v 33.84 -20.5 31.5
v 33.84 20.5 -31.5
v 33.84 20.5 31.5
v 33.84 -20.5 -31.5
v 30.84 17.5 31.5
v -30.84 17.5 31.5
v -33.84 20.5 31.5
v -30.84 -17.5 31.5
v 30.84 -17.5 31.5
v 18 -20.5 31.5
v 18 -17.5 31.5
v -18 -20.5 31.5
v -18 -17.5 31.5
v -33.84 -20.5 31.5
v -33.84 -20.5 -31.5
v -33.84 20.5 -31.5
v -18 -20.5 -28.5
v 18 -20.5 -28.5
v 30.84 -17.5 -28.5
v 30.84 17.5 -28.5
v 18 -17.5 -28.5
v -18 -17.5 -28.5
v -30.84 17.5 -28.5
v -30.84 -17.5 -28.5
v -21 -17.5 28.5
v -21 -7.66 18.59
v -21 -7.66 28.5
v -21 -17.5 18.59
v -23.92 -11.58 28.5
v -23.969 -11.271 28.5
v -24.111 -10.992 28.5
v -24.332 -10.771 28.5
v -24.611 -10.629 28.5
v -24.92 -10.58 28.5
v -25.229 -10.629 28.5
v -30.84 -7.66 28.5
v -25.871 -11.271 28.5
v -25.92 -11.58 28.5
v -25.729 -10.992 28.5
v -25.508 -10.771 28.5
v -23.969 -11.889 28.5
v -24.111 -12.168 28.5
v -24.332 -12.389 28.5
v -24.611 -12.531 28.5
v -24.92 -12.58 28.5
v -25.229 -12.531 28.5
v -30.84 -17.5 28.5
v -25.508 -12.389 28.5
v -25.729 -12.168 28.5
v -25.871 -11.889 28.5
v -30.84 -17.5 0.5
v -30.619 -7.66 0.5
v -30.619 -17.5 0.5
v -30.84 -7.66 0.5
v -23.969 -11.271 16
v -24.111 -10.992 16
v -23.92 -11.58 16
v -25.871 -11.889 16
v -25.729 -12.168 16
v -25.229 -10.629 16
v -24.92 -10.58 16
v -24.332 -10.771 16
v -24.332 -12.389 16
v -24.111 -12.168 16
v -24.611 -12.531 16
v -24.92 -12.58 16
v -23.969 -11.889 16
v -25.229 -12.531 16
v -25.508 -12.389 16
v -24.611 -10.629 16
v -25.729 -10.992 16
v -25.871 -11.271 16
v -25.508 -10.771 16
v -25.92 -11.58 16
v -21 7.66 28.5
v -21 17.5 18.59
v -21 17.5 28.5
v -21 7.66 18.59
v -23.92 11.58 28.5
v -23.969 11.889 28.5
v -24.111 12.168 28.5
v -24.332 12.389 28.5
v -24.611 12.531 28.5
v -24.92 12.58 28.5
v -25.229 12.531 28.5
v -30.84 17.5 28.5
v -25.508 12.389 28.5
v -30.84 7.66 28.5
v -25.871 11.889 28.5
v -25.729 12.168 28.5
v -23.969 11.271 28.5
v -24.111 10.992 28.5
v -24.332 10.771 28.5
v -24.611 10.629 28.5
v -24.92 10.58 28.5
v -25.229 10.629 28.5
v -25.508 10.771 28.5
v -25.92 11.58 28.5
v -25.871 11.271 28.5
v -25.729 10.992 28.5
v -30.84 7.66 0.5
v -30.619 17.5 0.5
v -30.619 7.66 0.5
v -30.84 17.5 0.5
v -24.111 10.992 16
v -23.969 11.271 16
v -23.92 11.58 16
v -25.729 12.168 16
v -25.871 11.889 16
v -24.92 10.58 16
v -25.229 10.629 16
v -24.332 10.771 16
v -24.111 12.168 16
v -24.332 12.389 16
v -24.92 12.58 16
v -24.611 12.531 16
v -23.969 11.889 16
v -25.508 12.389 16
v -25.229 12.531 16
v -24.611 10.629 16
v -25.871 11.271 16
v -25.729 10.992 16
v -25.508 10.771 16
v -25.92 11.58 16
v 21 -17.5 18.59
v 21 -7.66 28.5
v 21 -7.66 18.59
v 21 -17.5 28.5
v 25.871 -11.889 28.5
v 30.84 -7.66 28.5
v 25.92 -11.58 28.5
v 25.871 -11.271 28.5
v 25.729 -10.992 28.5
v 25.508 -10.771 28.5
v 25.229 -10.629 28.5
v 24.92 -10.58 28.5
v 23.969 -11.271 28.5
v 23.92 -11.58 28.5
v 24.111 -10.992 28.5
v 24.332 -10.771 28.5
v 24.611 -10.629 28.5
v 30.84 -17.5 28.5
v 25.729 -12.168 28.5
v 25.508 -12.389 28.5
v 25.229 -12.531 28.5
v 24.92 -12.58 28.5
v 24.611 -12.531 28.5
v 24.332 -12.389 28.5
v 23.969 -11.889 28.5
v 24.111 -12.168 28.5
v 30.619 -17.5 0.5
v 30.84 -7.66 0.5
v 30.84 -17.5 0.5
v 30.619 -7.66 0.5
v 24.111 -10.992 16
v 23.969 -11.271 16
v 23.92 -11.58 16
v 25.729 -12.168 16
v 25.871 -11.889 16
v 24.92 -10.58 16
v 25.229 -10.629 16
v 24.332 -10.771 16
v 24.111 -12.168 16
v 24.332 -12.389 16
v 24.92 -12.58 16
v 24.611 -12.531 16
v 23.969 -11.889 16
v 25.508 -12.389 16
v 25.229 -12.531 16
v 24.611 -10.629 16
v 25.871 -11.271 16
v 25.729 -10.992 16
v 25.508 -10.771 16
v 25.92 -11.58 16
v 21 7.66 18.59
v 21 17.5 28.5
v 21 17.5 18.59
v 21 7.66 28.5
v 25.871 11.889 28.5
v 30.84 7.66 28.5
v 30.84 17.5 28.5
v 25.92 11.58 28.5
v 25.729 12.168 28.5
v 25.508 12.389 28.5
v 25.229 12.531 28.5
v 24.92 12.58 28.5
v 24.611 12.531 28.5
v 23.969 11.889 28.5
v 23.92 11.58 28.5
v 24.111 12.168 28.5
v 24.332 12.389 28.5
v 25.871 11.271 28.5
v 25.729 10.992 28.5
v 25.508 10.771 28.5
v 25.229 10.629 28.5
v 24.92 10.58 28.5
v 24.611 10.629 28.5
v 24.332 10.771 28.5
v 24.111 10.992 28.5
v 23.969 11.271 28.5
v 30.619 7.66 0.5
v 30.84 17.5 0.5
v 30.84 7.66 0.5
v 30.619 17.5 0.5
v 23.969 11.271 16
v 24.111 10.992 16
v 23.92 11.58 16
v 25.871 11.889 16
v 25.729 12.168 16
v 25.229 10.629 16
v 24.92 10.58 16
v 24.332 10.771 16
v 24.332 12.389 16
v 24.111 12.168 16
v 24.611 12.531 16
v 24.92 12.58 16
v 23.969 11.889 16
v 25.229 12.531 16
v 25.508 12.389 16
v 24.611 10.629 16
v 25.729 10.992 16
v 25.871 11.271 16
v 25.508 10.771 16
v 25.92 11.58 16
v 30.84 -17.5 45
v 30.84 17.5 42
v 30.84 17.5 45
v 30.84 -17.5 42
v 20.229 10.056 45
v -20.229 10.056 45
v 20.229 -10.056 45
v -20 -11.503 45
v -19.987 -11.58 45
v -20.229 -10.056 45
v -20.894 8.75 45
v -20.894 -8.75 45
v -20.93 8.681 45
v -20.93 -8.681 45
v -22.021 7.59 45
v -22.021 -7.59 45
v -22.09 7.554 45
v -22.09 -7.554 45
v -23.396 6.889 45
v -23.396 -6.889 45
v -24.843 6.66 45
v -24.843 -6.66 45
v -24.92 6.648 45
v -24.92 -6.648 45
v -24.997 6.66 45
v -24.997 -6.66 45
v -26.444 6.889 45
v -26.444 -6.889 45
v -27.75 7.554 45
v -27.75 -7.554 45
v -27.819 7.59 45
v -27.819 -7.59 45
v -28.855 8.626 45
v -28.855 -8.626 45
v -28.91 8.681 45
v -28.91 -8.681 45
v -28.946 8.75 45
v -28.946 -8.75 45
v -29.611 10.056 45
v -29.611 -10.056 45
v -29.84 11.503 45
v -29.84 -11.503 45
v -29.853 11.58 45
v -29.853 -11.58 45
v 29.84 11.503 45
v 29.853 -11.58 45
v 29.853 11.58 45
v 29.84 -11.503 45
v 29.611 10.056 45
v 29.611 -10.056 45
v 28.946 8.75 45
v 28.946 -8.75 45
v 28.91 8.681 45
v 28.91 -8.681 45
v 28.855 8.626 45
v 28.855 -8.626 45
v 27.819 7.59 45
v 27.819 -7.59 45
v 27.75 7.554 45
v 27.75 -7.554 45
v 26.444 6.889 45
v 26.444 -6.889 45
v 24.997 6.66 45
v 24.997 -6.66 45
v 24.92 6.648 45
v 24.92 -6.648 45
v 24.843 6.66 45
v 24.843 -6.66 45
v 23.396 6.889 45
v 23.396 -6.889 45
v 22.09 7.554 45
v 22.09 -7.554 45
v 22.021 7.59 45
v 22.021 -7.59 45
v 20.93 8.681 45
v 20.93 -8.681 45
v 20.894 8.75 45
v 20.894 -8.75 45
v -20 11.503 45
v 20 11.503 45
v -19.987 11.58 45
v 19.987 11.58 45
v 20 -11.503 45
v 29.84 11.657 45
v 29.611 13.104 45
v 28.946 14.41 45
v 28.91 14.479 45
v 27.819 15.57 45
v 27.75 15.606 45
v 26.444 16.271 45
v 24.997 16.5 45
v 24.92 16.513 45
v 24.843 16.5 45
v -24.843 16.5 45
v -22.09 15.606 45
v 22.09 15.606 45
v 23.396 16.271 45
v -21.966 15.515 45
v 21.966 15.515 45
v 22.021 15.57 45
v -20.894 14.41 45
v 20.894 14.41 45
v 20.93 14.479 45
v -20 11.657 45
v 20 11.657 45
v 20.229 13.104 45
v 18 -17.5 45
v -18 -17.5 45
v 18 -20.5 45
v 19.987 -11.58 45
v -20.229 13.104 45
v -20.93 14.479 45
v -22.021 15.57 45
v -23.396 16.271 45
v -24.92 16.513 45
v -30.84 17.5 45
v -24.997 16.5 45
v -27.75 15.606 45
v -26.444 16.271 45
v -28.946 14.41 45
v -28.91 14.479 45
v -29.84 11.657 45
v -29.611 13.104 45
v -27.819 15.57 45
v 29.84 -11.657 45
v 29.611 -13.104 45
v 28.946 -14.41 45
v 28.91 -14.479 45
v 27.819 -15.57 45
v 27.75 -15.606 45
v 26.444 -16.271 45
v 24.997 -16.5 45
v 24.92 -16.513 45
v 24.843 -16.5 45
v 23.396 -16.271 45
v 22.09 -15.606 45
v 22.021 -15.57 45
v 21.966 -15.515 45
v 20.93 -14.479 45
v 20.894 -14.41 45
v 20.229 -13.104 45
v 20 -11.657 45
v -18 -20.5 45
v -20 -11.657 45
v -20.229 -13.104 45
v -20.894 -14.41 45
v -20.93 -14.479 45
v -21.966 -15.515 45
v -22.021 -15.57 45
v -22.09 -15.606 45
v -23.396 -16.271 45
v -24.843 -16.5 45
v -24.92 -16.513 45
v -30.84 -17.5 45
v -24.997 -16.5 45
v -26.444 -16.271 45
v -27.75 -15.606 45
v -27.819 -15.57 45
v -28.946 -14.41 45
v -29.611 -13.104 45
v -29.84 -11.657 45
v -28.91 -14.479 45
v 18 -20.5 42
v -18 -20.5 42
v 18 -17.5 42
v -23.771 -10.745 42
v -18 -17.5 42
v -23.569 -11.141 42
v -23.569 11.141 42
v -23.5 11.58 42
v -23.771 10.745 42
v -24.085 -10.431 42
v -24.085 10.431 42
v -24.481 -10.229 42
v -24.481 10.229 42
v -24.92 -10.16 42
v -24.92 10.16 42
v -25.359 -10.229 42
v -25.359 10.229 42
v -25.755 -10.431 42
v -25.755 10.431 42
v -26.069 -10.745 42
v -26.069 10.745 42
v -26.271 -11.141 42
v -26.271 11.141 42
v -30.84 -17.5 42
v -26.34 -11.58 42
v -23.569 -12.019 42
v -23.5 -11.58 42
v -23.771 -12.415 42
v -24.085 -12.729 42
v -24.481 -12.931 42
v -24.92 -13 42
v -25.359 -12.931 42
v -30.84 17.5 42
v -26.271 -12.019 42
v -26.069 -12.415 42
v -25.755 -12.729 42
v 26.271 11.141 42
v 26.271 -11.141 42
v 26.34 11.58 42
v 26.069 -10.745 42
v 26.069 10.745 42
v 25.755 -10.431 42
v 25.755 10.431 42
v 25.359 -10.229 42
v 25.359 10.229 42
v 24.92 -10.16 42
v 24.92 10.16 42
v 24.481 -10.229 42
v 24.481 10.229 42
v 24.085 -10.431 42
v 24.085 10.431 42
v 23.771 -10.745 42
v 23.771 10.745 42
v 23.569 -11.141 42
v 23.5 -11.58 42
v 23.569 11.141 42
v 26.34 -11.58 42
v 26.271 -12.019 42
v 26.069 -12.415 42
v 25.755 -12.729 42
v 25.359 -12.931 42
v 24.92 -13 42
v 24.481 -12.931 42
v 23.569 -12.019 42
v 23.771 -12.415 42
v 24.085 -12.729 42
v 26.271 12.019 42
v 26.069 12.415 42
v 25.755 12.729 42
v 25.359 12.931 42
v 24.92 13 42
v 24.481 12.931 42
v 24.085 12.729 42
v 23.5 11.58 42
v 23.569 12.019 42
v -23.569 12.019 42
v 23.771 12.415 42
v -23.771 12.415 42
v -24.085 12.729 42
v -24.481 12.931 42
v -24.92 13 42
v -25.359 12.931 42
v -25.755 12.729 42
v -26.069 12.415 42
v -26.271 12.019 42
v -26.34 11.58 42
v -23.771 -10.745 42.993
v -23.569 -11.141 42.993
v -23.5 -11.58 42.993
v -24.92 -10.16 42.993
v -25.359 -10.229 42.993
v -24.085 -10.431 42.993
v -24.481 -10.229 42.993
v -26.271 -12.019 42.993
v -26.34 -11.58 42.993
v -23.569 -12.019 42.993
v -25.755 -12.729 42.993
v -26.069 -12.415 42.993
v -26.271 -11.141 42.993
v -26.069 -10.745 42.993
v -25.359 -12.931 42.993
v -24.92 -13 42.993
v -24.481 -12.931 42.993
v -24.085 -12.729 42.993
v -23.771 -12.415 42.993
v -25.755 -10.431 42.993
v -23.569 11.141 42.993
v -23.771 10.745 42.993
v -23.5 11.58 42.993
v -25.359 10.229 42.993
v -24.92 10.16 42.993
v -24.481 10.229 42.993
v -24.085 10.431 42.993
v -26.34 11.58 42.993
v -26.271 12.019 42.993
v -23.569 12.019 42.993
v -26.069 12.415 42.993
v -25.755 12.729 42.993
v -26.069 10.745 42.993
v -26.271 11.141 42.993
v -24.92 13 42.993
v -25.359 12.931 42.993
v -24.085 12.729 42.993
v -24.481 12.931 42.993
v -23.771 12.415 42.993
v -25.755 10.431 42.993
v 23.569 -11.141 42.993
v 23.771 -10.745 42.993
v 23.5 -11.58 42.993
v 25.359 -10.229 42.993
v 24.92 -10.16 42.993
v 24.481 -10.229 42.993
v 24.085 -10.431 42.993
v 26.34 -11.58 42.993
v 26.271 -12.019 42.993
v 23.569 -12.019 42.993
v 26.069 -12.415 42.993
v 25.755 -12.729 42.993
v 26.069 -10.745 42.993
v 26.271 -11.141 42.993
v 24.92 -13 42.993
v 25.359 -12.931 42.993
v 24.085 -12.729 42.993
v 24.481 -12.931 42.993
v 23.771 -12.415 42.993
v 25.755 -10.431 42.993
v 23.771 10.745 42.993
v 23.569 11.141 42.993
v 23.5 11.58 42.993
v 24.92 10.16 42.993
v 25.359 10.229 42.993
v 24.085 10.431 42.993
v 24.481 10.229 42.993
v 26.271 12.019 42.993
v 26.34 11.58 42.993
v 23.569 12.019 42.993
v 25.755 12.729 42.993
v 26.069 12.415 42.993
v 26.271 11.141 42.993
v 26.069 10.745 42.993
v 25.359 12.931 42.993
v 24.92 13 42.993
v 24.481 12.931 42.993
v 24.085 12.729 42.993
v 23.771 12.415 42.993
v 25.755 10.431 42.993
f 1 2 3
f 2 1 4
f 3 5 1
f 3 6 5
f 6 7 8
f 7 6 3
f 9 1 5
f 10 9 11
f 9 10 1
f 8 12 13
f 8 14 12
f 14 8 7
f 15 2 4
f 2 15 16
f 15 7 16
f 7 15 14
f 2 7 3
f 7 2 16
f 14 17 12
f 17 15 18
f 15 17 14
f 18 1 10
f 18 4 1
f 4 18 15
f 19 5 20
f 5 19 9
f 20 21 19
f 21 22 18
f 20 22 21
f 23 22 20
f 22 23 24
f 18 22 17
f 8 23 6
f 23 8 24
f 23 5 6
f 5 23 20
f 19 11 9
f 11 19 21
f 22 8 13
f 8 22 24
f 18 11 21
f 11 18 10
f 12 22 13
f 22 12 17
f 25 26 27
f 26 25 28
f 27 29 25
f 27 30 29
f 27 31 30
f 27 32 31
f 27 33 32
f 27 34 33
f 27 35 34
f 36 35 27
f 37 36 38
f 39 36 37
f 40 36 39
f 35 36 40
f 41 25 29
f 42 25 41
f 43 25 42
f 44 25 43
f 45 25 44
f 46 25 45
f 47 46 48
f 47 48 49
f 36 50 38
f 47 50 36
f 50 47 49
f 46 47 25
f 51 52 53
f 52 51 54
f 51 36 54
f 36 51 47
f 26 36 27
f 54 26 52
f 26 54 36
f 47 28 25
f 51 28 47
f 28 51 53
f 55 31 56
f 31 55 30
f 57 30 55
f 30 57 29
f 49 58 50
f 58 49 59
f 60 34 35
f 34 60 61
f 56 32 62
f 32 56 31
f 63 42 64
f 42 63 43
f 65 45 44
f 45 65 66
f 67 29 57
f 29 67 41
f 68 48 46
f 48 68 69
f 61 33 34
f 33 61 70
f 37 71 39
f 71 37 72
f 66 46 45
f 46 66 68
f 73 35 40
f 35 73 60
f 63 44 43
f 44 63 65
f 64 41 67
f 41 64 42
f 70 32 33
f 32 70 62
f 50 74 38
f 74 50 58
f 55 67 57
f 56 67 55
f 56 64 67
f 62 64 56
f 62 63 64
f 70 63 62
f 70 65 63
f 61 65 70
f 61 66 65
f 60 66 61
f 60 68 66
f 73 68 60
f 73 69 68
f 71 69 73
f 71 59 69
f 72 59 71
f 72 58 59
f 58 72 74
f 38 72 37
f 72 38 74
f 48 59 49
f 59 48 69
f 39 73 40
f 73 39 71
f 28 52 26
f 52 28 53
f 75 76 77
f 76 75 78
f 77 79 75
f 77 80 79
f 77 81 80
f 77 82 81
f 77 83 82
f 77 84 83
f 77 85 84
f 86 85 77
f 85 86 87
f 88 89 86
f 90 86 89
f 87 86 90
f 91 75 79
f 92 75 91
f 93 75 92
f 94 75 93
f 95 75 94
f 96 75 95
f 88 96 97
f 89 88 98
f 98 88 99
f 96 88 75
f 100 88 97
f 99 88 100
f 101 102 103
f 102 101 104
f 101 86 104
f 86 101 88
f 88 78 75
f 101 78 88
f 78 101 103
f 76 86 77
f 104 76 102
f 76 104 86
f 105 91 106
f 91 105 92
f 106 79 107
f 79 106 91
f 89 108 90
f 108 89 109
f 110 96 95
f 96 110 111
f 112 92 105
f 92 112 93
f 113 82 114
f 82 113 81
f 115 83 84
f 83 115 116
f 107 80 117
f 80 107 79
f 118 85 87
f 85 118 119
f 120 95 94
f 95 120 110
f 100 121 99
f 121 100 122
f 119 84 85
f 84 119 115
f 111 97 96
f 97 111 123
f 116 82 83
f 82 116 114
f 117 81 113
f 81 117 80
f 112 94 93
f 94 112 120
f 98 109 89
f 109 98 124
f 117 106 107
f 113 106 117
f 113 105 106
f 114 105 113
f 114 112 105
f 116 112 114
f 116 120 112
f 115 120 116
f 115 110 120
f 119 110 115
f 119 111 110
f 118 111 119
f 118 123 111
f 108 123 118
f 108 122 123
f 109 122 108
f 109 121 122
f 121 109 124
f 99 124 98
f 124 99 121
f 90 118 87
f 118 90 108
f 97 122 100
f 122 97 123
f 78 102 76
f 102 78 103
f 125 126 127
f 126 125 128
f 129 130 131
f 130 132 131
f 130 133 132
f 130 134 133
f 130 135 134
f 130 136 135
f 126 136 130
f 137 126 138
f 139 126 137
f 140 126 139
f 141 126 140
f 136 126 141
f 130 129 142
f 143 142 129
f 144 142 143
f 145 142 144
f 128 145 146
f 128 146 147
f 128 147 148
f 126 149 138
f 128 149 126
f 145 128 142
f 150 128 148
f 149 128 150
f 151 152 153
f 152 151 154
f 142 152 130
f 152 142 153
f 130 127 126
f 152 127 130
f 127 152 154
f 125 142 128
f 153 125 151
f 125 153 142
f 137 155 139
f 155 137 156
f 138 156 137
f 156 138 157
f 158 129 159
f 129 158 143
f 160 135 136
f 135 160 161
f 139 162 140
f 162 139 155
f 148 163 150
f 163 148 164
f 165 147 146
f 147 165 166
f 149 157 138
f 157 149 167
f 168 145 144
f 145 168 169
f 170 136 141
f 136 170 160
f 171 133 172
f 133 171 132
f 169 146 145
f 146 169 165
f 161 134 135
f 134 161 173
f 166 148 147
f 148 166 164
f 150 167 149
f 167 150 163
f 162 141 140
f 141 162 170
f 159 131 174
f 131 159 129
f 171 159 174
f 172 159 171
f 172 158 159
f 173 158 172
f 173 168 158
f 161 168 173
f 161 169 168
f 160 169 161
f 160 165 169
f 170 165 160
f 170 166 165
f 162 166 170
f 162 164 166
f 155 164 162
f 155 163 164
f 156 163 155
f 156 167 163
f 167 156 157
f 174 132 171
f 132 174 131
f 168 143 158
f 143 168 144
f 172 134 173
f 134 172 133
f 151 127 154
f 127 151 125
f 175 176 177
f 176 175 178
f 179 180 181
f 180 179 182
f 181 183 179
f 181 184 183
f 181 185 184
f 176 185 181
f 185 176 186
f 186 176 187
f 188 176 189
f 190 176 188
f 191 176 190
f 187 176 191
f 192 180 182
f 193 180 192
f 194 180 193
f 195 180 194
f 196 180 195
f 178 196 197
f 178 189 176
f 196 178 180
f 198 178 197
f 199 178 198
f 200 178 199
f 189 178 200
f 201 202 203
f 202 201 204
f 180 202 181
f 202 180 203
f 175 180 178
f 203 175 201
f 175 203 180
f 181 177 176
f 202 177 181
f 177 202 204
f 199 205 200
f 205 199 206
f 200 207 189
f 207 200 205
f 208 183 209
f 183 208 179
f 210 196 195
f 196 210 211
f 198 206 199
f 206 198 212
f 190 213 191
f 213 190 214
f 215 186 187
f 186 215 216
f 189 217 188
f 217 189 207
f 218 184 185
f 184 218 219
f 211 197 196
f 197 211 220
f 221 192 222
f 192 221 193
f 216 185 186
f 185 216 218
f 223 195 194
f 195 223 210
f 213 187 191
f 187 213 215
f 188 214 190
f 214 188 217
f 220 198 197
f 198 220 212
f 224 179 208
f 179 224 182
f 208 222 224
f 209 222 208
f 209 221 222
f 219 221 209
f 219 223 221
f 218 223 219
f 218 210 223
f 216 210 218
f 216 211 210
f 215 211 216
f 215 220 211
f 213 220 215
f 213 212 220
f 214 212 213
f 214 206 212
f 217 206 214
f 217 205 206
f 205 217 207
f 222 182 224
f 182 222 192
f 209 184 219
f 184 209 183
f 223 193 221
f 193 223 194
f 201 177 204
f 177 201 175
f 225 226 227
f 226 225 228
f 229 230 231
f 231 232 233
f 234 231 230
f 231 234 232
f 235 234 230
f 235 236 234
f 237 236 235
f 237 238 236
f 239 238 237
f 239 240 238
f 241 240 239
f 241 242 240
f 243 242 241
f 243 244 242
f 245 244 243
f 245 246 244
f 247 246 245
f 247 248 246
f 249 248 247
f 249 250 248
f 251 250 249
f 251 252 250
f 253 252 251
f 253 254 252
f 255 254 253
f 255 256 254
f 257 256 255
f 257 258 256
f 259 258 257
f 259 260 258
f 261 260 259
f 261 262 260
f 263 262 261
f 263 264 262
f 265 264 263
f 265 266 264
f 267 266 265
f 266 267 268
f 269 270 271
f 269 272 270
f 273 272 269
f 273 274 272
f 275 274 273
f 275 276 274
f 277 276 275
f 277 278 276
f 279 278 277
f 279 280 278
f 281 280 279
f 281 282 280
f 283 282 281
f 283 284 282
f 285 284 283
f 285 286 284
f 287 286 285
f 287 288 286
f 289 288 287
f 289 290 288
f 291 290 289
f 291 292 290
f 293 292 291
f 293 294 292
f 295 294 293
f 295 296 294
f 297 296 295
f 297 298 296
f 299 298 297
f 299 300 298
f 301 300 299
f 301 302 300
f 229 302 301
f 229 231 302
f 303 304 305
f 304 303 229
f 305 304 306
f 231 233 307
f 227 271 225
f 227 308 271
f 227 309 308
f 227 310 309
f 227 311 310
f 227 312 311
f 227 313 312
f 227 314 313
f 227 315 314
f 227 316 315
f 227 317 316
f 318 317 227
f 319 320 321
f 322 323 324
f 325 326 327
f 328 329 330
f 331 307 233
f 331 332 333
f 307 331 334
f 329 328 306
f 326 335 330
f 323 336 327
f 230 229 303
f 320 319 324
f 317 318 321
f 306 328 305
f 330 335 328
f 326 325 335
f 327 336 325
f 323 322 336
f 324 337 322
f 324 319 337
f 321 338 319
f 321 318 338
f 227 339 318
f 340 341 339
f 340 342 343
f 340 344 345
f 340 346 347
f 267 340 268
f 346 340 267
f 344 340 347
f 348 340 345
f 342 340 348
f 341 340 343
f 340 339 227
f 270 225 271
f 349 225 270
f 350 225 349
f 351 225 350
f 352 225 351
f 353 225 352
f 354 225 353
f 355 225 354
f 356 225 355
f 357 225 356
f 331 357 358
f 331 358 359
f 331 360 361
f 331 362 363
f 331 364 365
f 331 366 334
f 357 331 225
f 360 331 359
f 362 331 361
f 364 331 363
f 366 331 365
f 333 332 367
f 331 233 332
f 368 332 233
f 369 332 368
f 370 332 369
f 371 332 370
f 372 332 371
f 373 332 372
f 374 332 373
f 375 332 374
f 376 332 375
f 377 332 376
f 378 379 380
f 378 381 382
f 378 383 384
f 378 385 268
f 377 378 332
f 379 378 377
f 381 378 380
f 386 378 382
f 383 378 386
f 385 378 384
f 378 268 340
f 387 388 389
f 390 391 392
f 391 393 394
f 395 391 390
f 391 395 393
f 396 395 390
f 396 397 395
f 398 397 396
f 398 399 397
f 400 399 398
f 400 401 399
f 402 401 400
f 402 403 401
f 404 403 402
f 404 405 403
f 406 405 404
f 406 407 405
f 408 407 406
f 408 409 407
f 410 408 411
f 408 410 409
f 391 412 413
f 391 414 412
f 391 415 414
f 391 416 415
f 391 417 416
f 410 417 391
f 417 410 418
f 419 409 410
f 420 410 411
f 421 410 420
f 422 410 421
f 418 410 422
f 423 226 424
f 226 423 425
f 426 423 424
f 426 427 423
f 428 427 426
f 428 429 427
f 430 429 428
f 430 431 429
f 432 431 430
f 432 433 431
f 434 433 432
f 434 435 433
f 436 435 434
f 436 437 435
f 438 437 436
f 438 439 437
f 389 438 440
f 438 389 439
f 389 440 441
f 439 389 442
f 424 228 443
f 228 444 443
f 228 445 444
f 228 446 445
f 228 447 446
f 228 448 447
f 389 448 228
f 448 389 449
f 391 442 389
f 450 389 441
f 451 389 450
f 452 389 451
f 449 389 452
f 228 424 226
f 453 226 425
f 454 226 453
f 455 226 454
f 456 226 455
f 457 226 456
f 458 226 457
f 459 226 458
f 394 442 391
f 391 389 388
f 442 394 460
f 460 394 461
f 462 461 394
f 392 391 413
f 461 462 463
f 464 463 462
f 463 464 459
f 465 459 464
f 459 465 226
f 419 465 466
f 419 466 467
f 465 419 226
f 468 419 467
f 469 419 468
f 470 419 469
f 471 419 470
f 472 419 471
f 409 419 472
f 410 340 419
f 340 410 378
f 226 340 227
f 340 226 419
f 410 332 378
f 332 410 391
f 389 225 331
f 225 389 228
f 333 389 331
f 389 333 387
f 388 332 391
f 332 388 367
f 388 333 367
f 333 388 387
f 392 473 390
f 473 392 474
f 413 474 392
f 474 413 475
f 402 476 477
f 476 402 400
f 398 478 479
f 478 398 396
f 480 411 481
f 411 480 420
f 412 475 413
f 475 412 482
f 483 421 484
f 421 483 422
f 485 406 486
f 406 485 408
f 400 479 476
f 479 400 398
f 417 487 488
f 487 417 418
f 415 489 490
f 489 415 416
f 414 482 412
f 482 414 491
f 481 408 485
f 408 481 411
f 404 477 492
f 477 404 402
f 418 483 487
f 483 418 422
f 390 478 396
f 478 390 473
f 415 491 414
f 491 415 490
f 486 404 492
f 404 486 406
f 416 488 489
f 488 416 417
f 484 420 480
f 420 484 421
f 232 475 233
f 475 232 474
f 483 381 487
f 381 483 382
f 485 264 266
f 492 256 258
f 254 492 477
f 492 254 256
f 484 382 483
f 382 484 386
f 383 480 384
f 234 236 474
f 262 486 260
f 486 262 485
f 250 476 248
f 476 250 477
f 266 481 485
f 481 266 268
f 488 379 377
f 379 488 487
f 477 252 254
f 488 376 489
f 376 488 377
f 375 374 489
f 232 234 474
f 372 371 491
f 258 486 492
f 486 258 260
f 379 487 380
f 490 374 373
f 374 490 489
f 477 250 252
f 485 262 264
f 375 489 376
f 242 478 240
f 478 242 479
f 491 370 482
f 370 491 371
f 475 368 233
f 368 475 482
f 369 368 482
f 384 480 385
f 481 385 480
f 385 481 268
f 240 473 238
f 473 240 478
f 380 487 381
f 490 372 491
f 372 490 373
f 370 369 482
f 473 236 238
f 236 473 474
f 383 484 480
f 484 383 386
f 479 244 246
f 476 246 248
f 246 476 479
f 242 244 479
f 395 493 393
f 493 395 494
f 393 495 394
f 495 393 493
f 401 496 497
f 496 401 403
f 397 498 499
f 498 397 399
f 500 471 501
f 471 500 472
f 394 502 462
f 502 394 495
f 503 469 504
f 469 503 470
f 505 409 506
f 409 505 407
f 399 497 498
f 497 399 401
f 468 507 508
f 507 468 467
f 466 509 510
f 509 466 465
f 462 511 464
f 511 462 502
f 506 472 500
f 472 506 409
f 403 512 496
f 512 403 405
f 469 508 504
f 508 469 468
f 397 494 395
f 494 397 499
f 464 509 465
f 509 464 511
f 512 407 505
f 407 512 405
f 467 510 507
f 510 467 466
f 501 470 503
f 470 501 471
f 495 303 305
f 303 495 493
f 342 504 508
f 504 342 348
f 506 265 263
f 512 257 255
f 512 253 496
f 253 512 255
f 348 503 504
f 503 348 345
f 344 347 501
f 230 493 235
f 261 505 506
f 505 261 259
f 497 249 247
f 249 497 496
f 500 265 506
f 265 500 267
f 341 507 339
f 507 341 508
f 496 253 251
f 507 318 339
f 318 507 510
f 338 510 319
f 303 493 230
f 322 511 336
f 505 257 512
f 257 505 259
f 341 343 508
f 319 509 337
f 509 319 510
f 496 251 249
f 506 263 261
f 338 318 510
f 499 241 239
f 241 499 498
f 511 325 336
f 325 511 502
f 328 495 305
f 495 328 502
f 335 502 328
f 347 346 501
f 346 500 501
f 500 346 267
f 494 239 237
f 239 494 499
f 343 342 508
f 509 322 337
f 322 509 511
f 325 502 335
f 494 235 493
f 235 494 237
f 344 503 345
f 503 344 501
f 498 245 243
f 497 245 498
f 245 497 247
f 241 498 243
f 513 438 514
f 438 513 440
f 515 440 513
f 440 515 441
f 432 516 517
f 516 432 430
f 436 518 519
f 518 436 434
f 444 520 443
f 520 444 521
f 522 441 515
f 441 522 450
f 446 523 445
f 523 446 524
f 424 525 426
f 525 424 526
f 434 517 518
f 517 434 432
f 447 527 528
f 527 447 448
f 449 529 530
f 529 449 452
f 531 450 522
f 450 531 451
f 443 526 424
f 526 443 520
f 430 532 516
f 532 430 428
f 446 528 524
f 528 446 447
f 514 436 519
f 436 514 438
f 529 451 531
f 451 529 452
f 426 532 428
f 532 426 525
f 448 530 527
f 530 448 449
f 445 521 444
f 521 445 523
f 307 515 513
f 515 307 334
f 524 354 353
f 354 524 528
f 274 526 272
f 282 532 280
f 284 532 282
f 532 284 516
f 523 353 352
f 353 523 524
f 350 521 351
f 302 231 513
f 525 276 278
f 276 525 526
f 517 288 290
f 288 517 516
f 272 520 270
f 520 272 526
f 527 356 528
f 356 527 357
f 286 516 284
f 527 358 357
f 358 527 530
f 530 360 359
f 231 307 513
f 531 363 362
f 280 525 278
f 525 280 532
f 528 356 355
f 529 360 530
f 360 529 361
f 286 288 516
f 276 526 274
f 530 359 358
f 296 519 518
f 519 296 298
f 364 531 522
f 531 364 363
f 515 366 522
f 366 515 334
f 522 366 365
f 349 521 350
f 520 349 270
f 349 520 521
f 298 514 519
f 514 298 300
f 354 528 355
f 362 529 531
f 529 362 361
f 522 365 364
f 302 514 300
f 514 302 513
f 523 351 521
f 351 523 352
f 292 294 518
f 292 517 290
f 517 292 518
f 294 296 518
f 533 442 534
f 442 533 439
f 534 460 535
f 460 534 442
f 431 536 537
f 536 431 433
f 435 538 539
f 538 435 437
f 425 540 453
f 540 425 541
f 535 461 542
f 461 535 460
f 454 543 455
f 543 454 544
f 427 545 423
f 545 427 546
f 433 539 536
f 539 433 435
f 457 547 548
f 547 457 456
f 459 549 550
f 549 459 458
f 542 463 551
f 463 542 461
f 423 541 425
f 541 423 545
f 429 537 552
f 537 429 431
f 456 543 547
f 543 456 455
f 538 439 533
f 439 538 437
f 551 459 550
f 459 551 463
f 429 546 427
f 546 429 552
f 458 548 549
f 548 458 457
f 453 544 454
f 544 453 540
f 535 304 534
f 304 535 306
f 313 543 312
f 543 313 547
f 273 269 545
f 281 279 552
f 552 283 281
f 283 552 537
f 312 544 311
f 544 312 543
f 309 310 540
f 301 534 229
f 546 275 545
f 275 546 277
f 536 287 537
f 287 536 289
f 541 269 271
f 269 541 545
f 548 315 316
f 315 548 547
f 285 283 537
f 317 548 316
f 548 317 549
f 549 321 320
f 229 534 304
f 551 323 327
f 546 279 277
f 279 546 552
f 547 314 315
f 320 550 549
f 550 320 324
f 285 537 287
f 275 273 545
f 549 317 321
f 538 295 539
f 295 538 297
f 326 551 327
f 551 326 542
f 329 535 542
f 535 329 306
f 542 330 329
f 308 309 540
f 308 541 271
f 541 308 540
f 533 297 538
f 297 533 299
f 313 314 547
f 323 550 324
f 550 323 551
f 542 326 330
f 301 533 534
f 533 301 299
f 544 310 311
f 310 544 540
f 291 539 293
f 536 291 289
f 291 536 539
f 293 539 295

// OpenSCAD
// The rectangular hole for the clip-in mains connector

mainsHoleX = 36;
mainsHoleY = 3;
mainsHoleZ = 57;

// How far back do the works go?

mainsDepth = 35;

// Countersunk Self Tapping Screws (RS 546-5480 - UTS #4, 13mm)

ScrewDia = 2.84;
ScrewPitch = 0.635;
ScrewRootDia = ScrewDia - ScrewPitch*5.0*sqrt(3.0)/8.0;
ScrewLength = 13;
ScrewHead = ScrewDia*2;

MainsBox();
MainsLid();

module MainsLid()
{
	translate([0,0, mainsHoleZ/2 + 15])
	difference()
	{
		union()
		{
			translate([0, (mainsHoleY - 3)/2, 0])
				cube([mainsHoleX+2*(ScrewDia+7) + 6, mainsDepth, 
					3], center=true);
			translate([0, (mainsHoleY - 3)/2-mainsDepth/2 - mainsHoleY/2, 0])
				cube([mainsHoleX, mainsHoleY, 3], 
					center=true);
		}

		for(x = [-1,1]) for(y=[-1,1])
		translate([x*((mainsHoleX+2*(ScrewDia+7)+6)/2-(ScrewDia+7)/2), 
				y*((mainsDepth)/2-(ScrewDia+7)/2 - (0.5 - y/2)*(mainsHoleY - 3)/2), 
				0])
					if(x < 0 && y < 0)
					{
							ScrewCentre(rad = ScrewDia/2, cone=true);
					} else if (x < 0 && y > 0)
					{
						mirror([0, 1, 0])
							ScrewCentre(rad = ScrewDia/2, cone=true);
					}else if (x > 0 && y < 0)
					{
						mirror([1, 0, 0])
							ScrewCentre(rad = ScrewDia/2, cone=true);
					}else
					{
						mirror([1, 0, 0])
						mirror([0, 1, 0])
							ScrewCentre(rad = ScrewDia/2, cone=true);
					}	
		}			
						
}


module MainsBox()
{
	union()
	{
		difference()
		{
			cube([mainsHoleX + 2*(ScrewDia+7) + 12, mainsDepth + 3 + mainsHoleY, 
				mainsHoleZ + 6], center=true);
			translate([0, (mainsHoleY - 3)/2, 3])
				cube([mainsHoleX+2*(ScrewDia+7) + 6, mainsDepth, mainsHoleZ + 6], 
					center=true);
			translate([0, -mainsDepth/2, 3])
				cube([mainsHoleX, mainsDepth, mainsHoleZ + 6], 
					center=true);
		}
		for(x = [-1,1]) for(y=[-1,1])
		translate([x*((mainsHoleX+2*(ScrewDia+7)+6)/2-(ScrewDia+7)/2), 
				y*((mainsDepth)/2-(ScrewDia+7)/2 - (0.5 - y/2)*(mainsHoleY - 3)/2), 
				(mainsHoleZ + 6 - (ScrewLength + 15))/2 - 3])
					if(x < 0 && y < 0)
					{
							ScrewHole(cn=false);
					} else if (x < 0 && y > 0)
					{
						mirror([0, 1, 0])
							ScrewHole(cn=false);
					}else if (x > 0 && y < 0)
					{
						mirror([1, 0, 0])
							ScrewHole(cn=false);
					}else
					{
						mirror([1, 0, 0])
						mirror([0, 1, 0])
							ScrewHole(cn=false);
					}
					
						
	}
}

module ScrewCentre(rad = ScrewRootDia/2, cone=false)
{
	translate([1, 1, 0])
			cylinder(r = rad, h = ScrewLength + 1, center=true, $fn=20);
	if(cone)
		translate([1, 1, (ScrewHead-rad)/6])
			cylinder(r1 = rad, , r2 = ScrewHead,
				h = 2*(ScrewHead-rad)/3.5, center=true, $fn=20);
}

module ScrewHole(cn=false)
{
	difference()
	{
		cube([ScrewDia+7, ScrewDia+7, ScrewLength + 15], center=true);
		translate([0,0,15/2 + 1])
			ScrewCentre(rad = ScrewRootDia/2, cn);
		translate([ScrewDia+3.8, 0, - 17])
			rotate([0,28,0])
				cube([ScrewDia+20, ScrewDia+10, ScrewLength + 30], center=true);		
	}
}
